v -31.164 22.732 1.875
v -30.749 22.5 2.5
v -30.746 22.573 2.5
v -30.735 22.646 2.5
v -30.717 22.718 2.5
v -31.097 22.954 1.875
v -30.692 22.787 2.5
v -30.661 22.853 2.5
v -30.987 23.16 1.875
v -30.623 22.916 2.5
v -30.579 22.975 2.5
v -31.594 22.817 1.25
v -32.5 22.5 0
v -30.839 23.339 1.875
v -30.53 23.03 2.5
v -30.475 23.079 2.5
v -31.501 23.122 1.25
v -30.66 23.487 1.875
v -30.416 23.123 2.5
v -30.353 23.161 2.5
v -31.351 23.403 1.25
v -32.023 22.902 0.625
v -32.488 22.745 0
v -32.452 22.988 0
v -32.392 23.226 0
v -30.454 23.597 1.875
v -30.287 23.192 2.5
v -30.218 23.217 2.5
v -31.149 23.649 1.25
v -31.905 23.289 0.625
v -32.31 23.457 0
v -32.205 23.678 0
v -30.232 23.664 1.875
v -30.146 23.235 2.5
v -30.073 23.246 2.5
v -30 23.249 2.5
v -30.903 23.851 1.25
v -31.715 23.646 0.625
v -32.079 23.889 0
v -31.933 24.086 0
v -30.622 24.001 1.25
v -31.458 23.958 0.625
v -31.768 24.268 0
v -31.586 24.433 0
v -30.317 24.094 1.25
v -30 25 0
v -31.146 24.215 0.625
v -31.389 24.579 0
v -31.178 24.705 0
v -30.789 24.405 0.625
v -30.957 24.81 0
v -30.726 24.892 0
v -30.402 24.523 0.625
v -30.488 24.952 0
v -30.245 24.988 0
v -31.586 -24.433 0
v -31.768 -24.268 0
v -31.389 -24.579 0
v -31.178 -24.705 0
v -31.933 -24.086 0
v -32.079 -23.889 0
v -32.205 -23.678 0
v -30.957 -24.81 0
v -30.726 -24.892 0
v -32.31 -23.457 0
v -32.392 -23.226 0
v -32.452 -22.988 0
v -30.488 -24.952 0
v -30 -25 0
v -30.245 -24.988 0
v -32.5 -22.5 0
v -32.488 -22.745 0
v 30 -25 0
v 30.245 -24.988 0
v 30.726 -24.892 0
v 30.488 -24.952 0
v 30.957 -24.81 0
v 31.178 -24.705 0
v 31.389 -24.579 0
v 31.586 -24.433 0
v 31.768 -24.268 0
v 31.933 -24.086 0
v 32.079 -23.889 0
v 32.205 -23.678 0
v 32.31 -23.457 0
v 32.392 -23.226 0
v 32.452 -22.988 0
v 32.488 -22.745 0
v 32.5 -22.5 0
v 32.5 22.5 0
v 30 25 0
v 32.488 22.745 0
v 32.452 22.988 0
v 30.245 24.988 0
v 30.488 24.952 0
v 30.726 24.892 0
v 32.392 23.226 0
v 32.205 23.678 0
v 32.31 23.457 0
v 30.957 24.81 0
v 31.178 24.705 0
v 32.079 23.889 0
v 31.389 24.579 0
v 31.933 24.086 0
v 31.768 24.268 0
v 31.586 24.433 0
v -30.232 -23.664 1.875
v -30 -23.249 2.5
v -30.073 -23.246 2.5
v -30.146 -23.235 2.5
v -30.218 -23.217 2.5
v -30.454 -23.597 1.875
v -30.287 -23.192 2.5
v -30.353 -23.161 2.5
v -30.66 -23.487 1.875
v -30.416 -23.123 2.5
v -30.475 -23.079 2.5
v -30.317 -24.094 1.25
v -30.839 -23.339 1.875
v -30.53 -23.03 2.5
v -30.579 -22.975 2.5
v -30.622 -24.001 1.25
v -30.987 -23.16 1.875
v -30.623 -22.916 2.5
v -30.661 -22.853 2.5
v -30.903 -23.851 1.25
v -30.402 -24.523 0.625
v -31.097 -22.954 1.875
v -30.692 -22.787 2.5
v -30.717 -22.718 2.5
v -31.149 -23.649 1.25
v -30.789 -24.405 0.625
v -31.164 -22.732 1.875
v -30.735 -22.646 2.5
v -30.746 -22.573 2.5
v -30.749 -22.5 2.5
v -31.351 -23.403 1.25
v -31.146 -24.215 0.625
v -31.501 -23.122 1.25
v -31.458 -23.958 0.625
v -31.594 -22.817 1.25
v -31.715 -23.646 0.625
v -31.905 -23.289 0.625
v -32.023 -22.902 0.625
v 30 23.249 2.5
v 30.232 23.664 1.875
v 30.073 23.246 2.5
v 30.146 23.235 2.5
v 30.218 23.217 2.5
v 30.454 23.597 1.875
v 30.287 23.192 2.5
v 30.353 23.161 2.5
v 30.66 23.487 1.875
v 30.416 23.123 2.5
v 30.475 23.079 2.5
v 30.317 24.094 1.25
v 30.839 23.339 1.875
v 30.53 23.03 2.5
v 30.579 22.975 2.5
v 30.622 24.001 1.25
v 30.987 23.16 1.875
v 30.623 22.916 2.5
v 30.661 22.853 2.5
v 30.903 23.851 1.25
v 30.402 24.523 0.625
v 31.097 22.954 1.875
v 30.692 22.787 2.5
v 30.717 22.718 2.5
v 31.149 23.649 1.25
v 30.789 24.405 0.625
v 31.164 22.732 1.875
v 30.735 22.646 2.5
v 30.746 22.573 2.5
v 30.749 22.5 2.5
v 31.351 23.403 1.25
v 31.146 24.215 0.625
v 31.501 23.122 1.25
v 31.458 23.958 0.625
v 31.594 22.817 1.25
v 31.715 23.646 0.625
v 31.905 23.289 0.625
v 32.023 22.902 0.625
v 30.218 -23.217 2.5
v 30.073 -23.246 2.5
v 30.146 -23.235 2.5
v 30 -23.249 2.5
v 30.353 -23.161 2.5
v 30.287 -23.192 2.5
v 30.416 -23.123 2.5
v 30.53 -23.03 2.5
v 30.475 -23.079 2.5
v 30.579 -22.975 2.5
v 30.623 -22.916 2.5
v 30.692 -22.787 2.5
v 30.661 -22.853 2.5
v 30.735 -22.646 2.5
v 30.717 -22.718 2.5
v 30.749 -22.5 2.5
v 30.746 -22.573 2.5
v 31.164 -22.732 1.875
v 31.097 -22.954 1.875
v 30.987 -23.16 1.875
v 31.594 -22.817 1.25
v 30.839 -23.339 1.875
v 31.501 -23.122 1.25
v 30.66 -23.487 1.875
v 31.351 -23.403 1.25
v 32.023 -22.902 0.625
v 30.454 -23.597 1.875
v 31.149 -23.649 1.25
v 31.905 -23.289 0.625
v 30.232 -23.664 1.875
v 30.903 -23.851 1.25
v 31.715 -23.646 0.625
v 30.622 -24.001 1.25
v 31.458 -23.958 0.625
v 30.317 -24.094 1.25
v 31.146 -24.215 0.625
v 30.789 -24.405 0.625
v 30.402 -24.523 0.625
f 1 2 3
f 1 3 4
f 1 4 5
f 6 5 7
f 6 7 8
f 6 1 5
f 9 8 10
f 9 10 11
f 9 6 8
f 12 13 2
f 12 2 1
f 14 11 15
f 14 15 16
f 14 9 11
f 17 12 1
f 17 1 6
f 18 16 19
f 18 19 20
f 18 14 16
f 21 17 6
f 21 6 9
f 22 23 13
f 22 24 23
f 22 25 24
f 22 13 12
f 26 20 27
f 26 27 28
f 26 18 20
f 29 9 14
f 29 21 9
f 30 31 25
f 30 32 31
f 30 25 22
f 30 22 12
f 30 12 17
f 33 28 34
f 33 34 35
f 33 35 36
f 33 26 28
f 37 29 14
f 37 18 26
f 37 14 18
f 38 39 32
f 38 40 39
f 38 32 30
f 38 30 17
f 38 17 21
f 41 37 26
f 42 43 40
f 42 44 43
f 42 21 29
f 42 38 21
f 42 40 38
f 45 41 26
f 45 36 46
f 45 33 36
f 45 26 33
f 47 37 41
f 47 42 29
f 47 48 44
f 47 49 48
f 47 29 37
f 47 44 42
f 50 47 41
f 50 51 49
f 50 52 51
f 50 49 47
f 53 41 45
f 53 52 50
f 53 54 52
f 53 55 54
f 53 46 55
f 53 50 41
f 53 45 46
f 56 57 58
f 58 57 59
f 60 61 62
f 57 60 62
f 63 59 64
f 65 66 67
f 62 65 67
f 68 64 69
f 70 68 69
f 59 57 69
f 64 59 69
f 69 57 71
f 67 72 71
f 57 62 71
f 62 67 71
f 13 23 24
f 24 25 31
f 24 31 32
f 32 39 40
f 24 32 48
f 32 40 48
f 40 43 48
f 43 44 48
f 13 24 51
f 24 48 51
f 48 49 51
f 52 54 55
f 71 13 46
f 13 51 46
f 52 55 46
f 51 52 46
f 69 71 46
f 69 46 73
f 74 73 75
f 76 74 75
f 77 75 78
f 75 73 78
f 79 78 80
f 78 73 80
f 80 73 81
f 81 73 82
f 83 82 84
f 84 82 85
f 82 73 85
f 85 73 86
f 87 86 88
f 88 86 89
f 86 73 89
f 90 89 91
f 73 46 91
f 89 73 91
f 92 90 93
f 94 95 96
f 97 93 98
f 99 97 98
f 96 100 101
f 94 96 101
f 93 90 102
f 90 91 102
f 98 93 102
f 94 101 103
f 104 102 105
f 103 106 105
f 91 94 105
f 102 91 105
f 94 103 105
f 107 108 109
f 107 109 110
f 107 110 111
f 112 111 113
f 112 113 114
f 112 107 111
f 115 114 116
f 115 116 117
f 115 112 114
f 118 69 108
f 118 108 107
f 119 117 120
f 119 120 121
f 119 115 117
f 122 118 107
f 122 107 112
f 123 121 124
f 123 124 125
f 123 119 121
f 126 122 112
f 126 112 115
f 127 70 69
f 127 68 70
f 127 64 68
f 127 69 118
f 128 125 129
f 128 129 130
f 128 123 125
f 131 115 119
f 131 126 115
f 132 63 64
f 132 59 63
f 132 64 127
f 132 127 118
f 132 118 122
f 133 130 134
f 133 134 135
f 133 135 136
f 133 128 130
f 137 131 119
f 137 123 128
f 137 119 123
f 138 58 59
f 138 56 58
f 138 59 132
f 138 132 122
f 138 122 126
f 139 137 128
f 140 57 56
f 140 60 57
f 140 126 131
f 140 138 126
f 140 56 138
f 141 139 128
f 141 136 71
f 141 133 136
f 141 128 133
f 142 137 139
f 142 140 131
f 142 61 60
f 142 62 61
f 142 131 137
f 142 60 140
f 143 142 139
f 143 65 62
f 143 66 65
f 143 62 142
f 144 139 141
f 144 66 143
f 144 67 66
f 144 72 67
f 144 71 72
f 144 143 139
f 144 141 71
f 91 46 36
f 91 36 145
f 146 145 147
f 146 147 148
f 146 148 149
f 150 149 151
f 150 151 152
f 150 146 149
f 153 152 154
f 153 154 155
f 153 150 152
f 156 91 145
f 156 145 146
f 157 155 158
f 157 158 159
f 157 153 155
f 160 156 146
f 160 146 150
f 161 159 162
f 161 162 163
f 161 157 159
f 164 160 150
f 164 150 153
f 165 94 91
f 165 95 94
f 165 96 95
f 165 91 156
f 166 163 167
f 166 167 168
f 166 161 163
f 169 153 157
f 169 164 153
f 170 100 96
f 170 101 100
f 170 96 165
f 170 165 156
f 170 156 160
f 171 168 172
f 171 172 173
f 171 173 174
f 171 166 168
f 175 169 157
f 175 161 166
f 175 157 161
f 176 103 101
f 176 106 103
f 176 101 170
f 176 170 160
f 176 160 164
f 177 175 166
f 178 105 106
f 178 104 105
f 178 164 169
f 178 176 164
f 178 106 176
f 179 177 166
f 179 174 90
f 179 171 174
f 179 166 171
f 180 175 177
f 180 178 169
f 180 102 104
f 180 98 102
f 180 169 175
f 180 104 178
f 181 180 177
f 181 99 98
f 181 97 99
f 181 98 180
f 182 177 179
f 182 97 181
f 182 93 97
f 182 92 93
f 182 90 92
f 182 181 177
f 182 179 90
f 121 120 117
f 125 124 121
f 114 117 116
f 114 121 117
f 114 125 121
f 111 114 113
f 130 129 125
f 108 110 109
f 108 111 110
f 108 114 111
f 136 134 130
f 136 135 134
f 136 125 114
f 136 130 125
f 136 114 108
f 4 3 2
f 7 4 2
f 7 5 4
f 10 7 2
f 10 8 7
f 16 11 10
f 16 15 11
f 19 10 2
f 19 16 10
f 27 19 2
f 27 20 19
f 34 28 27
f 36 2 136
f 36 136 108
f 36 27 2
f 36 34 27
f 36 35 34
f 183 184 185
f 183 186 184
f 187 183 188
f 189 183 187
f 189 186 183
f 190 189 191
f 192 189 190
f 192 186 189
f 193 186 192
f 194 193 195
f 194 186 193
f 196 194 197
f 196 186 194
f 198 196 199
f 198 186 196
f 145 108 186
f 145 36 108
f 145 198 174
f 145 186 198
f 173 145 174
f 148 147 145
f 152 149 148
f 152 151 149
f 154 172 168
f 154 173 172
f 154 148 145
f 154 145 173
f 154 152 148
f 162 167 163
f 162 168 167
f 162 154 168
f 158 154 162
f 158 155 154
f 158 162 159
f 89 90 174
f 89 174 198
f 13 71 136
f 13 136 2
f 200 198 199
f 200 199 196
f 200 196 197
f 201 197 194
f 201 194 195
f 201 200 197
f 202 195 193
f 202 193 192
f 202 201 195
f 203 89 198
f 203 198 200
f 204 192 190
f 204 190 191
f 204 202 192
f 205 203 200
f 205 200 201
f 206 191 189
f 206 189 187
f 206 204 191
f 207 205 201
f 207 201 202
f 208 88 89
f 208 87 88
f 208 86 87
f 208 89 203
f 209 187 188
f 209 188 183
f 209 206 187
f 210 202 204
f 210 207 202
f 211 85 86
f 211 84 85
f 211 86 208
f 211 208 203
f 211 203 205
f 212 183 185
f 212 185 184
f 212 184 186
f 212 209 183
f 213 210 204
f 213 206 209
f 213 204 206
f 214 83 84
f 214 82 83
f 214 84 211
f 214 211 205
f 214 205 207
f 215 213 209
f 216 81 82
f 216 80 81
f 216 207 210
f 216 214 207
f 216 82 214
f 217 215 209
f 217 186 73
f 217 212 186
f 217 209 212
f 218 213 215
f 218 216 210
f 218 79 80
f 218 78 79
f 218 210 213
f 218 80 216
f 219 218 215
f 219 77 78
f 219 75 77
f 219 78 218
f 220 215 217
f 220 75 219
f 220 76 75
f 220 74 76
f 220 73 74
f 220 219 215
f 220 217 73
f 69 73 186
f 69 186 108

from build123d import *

# Parameters (mm, degrees)
F0_W     = 65
F0_H     = 50
F1_DEPTH = 2.5
F2_R     = 2.5
F3_SIZE2 = 2.49999
F3_SIZE  = 1.750509


# Not quite as in the source:
# - a fillet or chamfer is up to 0.001 mm smaller than in the source, because OpenCascade refuses the exact size


with BuildPart() as f1:
    # F0 (on Top) → F1 (new body)
    with BuildSketch(Plane.XY):
        Rectangle(F0_W, F0_H)
    extrude(amount=F1_DEPTH)

    # F2
    f2_edges = [f1.edges().sort_by_distance(p)[0] for p in [
        (-32.5, -25, 1.25),
        (32.5, -25, 1.25),
        (32.5, 25, 1.25),
        (-32.5, 25, 1.25),
    ]]
    fillet(f2_edges, radius=F2_R)

    # F3 (size 1.7505188455 and 2.5 in the source; OpenCascade refuses exactly that, so slightly less here)
    f3_edges = [f1.edges().sort_by_distance(p)[0] for p in [
        (-32.5, 0, 2.5),
        (-31.767767, 24.267767, 2.5),
        (0, 25, 2.5),
        (31.767767, 24.267767, 2.5),
        (32.5, 0, 2.5),
        (31.767767, -24.267767, 2.5),
        (0, -25, 2.5),
        (-31.767767, -24.267767, 2.5),
    ]]
    f3_side = f1.faces().sort_by_distance((0, 0, 2.5))[0]
    chamfer(f3_edges, length=F3_SIZE, length2=F3_SIZE2, reference=f3_side)


solid = f1.part
